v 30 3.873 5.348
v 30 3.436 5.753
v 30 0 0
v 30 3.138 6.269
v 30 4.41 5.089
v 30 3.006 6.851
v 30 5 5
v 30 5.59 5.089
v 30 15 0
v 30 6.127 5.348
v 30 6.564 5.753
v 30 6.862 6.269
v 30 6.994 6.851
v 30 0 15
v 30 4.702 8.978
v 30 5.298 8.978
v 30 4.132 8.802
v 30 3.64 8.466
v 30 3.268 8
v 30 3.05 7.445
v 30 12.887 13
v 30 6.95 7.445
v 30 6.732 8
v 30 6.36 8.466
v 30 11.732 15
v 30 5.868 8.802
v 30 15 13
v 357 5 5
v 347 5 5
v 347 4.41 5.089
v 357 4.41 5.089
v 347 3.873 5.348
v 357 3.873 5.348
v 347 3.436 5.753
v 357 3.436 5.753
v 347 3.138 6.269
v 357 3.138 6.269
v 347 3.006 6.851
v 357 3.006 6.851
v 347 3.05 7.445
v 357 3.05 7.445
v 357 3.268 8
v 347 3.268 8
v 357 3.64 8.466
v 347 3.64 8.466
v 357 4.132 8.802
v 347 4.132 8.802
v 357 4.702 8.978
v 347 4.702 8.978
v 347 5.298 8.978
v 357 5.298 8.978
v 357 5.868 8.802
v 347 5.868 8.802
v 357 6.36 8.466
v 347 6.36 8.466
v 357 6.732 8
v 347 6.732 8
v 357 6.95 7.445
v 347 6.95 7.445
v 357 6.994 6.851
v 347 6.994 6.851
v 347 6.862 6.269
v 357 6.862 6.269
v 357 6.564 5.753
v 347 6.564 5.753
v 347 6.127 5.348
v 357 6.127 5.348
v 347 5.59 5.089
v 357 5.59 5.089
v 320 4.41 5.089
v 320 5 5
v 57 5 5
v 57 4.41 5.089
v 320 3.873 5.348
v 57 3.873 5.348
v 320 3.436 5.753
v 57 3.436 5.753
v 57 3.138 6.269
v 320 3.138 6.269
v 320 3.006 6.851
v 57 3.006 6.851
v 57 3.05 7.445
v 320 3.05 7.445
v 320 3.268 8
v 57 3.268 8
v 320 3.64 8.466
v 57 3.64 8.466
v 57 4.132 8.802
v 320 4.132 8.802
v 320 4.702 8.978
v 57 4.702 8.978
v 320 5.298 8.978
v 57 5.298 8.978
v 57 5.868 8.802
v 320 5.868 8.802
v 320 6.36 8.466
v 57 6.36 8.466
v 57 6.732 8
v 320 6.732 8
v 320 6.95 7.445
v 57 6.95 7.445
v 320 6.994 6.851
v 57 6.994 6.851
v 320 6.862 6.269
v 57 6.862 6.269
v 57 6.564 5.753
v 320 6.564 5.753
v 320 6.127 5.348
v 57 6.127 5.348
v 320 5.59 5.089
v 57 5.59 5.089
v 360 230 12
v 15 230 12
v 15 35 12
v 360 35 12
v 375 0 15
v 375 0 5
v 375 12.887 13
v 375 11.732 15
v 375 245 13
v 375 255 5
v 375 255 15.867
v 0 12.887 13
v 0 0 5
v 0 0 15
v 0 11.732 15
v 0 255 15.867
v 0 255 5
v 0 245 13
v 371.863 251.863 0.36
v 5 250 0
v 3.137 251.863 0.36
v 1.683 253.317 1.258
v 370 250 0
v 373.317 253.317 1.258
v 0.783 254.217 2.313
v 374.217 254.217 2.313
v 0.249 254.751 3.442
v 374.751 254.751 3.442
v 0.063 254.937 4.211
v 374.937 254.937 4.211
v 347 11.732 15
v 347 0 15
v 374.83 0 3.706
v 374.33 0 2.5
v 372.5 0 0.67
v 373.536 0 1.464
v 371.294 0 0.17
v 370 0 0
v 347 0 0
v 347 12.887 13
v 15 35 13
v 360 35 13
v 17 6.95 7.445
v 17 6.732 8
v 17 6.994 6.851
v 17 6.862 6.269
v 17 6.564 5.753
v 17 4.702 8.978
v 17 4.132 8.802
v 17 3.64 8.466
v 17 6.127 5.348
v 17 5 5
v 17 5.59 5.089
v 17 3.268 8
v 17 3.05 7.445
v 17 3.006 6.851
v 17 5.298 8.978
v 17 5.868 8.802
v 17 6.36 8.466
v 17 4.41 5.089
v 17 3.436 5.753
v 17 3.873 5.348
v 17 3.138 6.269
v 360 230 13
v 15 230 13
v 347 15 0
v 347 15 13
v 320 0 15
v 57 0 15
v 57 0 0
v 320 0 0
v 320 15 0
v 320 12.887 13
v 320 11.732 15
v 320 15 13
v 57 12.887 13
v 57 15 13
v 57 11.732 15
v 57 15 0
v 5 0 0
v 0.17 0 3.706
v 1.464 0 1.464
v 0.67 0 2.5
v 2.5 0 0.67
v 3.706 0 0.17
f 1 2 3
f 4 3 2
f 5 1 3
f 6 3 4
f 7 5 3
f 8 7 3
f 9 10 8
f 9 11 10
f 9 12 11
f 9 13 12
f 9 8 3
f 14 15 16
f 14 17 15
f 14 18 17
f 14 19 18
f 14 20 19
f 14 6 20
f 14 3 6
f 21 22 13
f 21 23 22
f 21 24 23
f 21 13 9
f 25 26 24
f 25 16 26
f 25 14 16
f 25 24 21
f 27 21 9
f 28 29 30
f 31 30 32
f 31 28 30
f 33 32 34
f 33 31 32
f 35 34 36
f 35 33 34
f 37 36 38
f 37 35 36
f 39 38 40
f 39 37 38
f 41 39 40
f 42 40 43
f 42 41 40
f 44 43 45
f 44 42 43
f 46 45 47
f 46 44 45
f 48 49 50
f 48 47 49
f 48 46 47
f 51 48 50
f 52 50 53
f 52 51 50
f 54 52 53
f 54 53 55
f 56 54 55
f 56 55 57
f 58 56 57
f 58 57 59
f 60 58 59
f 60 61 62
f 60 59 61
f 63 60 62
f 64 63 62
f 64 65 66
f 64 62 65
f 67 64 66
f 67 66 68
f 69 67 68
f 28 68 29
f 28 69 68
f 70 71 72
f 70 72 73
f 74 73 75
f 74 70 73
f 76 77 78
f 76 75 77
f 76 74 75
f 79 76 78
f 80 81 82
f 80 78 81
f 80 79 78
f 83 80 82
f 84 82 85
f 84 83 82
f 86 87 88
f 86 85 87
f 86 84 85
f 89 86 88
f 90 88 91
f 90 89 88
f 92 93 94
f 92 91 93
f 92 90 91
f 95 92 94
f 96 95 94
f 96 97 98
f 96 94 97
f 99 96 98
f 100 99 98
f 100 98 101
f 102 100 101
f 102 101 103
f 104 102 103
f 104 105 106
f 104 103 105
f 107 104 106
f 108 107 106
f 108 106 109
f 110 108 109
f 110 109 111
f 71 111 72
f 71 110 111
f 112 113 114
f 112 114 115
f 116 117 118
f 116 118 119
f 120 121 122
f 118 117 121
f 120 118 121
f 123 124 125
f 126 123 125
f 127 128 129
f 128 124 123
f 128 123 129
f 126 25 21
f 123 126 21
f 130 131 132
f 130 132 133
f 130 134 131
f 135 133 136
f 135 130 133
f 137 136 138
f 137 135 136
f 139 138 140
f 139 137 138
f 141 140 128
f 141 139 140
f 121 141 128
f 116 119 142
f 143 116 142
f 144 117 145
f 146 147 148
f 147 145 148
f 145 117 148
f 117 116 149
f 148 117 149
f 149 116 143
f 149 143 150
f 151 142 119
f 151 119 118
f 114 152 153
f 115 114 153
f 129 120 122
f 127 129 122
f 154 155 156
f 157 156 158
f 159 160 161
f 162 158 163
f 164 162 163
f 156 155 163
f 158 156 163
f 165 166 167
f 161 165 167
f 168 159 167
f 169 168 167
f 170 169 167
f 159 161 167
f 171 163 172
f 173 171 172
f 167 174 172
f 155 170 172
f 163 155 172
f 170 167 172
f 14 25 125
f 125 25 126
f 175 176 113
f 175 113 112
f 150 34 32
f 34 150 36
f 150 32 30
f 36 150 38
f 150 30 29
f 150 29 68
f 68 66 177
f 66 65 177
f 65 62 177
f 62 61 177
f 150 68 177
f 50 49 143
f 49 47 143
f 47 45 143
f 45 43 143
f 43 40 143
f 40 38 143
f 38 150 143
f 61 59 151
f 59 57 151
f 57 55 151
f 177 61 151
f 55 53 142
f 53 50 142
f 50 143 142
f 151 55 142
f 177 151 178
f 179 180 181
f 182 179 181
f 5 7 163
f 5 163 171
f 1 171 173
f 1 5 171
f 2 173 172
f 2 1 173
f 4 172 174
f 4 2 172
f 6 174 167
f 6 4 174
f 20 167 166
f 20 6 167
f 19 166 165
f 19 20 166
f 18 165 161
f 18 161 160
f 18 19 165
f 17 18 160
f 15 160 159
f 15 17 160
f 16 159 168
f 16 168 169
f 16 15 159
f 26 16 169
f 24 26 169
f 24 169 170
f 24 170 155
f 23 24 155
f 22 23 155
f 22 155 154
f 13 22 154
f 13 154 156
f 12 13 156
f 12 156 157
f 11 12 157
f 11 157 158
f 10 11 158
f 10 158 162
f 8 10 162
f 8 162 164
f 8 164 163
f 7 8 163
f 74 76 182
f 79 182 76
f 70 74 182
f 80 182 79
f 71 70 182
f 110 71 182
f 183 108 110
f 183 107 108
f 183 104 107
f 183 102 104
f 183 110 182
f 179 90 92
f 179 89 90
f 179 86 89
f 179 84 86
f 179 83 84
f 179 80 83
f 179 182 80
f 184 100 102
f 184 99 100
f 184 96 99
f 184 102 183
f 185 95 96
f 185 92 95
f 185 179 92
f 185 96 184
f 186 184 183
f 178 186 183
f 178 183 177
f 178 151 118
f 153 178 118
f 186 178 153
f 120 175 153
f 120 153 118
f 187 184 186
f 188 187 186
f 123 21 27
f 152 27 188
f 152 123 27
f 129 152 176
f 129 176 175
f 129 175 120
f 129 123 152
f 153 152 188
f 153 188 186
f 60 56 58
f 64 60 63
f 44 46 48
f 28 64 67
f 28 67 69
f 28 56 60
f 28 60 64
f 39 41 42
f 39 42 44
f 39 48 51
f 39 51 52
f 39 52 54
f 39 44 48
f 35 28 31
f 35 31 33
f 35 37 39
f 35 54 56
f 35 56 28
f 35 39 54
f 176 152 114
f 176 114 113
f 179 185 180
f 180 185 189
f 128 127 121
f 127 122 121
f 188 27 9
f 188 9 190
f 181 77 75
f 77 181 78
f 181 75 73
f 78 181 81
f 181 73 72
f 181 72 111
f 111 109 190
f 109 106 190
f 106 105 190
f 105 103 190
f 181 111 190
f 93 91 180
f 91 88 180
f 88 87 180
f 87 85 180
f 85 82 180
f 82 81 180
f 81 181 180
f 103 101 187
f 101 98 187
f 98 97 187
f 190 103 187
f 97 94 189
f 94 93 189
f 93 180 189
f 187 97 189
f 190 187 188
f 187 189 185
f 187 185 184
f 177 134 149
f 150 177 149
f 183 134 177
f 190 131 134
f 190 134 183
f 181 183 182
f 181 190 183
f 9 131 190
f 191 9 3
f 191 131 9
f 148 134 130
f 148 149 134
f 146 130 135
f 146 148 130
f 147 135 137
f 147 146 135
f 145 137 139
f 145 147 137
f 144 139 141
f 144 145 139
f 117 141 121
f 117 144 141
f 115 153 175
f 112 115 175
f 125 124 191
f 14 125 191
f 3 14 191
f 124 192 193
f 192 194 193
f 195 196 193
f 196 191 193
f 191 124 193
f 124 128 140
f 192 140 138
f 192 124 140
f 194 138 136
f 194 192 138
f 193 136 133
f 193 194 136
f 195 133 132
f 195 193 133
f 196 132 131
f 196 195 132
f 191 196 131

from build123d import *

# Parameters (mm, degrees)
BOSS_EXTRUDE1_DEPTH     = 375
SKETCH2_W               = 345
SKETCH2_H               = 195
CUT_EXTRUDE1_DEPTH      = 1
CHAMFER1_SIZE           = 5
CHAMFER1_SIZE_2         = 2.886751346
SKETCH3_W               = 27
SKETCH3_H               = 15
CUT_EXTRUDE2_DEPTH      = 30
CUT_EXTRUDE3_DEPTH      = 40
CUT_EXTRUDE3_DEPTH_BACK = 300
SKETCH4_R               = 2
BOSS_EXTRUDE2_DEPTH     = 375
FILLET1_R               = 5


with BuildPart() as part:
    # Sketch1 → Boss-Extrude1 (new body)
    with BuildSketch(Plane(origin=(0, 0, 0), x_dir=(0, 0, -1), z_dir=(1, 0, 0))):
        Polygon((0, 0), (-13, 0), (-15, 0), (-15, 10), (-13, 10), (-13, 255), (0, 255), align=None)
    extrude(amount=BOSS_EXTRUDE1_DEPTH)

    # Sketch2 → Cut-Extrude1 (cut)
    with BuildSketch(Plane.XY.offset(13)):
        with Locations((187.5, 132.5)):
            Rectangle(SKETCH2_W, SKETCH2_H)
    extrude(amount=-CUT_EXTRUDE1_DEPTH, mode=Mode.SUBTRACT)

    # Chamfer1
    # the kernel refuses this chamfer: 5, 2.886751346 mm, written as the material it adds along each edge
    with BuildSketch(Plane(origin=(0, 10, 13), x_dir=(0, -0.01932676561270064, 0.9998132206222079), z_dir=(1, 0, 0))) as chamfer1_piece_1_section:
        Polygon((CHAMFER1_SIZE * 0.999813220622, -CHAMFER1_SIZE * 0.0193267656127), (-CHAMFER1_SIZE_2 * 0.0193267656124, -CHAMFER1_SIZE_2 * 0.999813220604), (0, 0), align=None)
    chamfer1_piece_1 = extrude(amount=375, mode=Mode.PRIVATE)
    chamfer1_piece_1 = split(chamfer1_piece_1, bisect_by=Plane(origin=(187.5, 11.179939158, 15), z_dir=(0, 0, -1)), keep=Keep.TOP, mode=Mode.PRIVATE)
    add(chamfer1_piece_1)

    # Sketch3 → Cut-Extrude2 (cut)
    with BuildSketch(Plane.XY.offset(15)):
        with Locations((43.5, 7.5)):
            Rectangle(SKETCH3_W, SKETCH3_H)
        with Locations((333.5, 7.5)):
            Rectangle(SKETCH3_W, SKETCH3_H)
    extrude(amount=-CUT_EXTRUDE2_DEPTH, mode=Mode.SUBTRACT)

    # Sketch4 → Cut-Extrude3 (cut, two sides: drawn at the far end of the back side and taken through both)
    with BuildSketch(Plane.ZY.offset(-57).offset(-CUT_EXTRUDE3_DEPTH_BACK)):
        with Locations(Location((7, 5, 0), (0, 0, 180))):
            Circle(SKETCH4_R)
    extrude(amount=CUT_EXTRUDE3_DEPTH + CUT_EXTRUDE3_DEPTH_BACK, mode=Mode.SUBTRACT)

    # Sketch5 → Boss-Extrude2 (add)
    with BuildSketch(Plane(origin=(375, 0, 0), x_dir=(0, 0, -1), z_dir=(1, 0, 0))):
        Polygon((-13, 245), (-15.867453858, 255), (-13, 255), align=None)
    extrude(amount=-BOSS_EXTRUDE2_DEPTH)

    # Fillet1
    fillet1_edges = [part.edges().sort_by_distance(p)[0] for p in [
        (187.5, 255, 0),
        (375, 127.5, 0),
        (0, 127.5, 0),
    ]]
    fillet(fillet1_edges, radius=FILLET1_R)


solid = part.part
